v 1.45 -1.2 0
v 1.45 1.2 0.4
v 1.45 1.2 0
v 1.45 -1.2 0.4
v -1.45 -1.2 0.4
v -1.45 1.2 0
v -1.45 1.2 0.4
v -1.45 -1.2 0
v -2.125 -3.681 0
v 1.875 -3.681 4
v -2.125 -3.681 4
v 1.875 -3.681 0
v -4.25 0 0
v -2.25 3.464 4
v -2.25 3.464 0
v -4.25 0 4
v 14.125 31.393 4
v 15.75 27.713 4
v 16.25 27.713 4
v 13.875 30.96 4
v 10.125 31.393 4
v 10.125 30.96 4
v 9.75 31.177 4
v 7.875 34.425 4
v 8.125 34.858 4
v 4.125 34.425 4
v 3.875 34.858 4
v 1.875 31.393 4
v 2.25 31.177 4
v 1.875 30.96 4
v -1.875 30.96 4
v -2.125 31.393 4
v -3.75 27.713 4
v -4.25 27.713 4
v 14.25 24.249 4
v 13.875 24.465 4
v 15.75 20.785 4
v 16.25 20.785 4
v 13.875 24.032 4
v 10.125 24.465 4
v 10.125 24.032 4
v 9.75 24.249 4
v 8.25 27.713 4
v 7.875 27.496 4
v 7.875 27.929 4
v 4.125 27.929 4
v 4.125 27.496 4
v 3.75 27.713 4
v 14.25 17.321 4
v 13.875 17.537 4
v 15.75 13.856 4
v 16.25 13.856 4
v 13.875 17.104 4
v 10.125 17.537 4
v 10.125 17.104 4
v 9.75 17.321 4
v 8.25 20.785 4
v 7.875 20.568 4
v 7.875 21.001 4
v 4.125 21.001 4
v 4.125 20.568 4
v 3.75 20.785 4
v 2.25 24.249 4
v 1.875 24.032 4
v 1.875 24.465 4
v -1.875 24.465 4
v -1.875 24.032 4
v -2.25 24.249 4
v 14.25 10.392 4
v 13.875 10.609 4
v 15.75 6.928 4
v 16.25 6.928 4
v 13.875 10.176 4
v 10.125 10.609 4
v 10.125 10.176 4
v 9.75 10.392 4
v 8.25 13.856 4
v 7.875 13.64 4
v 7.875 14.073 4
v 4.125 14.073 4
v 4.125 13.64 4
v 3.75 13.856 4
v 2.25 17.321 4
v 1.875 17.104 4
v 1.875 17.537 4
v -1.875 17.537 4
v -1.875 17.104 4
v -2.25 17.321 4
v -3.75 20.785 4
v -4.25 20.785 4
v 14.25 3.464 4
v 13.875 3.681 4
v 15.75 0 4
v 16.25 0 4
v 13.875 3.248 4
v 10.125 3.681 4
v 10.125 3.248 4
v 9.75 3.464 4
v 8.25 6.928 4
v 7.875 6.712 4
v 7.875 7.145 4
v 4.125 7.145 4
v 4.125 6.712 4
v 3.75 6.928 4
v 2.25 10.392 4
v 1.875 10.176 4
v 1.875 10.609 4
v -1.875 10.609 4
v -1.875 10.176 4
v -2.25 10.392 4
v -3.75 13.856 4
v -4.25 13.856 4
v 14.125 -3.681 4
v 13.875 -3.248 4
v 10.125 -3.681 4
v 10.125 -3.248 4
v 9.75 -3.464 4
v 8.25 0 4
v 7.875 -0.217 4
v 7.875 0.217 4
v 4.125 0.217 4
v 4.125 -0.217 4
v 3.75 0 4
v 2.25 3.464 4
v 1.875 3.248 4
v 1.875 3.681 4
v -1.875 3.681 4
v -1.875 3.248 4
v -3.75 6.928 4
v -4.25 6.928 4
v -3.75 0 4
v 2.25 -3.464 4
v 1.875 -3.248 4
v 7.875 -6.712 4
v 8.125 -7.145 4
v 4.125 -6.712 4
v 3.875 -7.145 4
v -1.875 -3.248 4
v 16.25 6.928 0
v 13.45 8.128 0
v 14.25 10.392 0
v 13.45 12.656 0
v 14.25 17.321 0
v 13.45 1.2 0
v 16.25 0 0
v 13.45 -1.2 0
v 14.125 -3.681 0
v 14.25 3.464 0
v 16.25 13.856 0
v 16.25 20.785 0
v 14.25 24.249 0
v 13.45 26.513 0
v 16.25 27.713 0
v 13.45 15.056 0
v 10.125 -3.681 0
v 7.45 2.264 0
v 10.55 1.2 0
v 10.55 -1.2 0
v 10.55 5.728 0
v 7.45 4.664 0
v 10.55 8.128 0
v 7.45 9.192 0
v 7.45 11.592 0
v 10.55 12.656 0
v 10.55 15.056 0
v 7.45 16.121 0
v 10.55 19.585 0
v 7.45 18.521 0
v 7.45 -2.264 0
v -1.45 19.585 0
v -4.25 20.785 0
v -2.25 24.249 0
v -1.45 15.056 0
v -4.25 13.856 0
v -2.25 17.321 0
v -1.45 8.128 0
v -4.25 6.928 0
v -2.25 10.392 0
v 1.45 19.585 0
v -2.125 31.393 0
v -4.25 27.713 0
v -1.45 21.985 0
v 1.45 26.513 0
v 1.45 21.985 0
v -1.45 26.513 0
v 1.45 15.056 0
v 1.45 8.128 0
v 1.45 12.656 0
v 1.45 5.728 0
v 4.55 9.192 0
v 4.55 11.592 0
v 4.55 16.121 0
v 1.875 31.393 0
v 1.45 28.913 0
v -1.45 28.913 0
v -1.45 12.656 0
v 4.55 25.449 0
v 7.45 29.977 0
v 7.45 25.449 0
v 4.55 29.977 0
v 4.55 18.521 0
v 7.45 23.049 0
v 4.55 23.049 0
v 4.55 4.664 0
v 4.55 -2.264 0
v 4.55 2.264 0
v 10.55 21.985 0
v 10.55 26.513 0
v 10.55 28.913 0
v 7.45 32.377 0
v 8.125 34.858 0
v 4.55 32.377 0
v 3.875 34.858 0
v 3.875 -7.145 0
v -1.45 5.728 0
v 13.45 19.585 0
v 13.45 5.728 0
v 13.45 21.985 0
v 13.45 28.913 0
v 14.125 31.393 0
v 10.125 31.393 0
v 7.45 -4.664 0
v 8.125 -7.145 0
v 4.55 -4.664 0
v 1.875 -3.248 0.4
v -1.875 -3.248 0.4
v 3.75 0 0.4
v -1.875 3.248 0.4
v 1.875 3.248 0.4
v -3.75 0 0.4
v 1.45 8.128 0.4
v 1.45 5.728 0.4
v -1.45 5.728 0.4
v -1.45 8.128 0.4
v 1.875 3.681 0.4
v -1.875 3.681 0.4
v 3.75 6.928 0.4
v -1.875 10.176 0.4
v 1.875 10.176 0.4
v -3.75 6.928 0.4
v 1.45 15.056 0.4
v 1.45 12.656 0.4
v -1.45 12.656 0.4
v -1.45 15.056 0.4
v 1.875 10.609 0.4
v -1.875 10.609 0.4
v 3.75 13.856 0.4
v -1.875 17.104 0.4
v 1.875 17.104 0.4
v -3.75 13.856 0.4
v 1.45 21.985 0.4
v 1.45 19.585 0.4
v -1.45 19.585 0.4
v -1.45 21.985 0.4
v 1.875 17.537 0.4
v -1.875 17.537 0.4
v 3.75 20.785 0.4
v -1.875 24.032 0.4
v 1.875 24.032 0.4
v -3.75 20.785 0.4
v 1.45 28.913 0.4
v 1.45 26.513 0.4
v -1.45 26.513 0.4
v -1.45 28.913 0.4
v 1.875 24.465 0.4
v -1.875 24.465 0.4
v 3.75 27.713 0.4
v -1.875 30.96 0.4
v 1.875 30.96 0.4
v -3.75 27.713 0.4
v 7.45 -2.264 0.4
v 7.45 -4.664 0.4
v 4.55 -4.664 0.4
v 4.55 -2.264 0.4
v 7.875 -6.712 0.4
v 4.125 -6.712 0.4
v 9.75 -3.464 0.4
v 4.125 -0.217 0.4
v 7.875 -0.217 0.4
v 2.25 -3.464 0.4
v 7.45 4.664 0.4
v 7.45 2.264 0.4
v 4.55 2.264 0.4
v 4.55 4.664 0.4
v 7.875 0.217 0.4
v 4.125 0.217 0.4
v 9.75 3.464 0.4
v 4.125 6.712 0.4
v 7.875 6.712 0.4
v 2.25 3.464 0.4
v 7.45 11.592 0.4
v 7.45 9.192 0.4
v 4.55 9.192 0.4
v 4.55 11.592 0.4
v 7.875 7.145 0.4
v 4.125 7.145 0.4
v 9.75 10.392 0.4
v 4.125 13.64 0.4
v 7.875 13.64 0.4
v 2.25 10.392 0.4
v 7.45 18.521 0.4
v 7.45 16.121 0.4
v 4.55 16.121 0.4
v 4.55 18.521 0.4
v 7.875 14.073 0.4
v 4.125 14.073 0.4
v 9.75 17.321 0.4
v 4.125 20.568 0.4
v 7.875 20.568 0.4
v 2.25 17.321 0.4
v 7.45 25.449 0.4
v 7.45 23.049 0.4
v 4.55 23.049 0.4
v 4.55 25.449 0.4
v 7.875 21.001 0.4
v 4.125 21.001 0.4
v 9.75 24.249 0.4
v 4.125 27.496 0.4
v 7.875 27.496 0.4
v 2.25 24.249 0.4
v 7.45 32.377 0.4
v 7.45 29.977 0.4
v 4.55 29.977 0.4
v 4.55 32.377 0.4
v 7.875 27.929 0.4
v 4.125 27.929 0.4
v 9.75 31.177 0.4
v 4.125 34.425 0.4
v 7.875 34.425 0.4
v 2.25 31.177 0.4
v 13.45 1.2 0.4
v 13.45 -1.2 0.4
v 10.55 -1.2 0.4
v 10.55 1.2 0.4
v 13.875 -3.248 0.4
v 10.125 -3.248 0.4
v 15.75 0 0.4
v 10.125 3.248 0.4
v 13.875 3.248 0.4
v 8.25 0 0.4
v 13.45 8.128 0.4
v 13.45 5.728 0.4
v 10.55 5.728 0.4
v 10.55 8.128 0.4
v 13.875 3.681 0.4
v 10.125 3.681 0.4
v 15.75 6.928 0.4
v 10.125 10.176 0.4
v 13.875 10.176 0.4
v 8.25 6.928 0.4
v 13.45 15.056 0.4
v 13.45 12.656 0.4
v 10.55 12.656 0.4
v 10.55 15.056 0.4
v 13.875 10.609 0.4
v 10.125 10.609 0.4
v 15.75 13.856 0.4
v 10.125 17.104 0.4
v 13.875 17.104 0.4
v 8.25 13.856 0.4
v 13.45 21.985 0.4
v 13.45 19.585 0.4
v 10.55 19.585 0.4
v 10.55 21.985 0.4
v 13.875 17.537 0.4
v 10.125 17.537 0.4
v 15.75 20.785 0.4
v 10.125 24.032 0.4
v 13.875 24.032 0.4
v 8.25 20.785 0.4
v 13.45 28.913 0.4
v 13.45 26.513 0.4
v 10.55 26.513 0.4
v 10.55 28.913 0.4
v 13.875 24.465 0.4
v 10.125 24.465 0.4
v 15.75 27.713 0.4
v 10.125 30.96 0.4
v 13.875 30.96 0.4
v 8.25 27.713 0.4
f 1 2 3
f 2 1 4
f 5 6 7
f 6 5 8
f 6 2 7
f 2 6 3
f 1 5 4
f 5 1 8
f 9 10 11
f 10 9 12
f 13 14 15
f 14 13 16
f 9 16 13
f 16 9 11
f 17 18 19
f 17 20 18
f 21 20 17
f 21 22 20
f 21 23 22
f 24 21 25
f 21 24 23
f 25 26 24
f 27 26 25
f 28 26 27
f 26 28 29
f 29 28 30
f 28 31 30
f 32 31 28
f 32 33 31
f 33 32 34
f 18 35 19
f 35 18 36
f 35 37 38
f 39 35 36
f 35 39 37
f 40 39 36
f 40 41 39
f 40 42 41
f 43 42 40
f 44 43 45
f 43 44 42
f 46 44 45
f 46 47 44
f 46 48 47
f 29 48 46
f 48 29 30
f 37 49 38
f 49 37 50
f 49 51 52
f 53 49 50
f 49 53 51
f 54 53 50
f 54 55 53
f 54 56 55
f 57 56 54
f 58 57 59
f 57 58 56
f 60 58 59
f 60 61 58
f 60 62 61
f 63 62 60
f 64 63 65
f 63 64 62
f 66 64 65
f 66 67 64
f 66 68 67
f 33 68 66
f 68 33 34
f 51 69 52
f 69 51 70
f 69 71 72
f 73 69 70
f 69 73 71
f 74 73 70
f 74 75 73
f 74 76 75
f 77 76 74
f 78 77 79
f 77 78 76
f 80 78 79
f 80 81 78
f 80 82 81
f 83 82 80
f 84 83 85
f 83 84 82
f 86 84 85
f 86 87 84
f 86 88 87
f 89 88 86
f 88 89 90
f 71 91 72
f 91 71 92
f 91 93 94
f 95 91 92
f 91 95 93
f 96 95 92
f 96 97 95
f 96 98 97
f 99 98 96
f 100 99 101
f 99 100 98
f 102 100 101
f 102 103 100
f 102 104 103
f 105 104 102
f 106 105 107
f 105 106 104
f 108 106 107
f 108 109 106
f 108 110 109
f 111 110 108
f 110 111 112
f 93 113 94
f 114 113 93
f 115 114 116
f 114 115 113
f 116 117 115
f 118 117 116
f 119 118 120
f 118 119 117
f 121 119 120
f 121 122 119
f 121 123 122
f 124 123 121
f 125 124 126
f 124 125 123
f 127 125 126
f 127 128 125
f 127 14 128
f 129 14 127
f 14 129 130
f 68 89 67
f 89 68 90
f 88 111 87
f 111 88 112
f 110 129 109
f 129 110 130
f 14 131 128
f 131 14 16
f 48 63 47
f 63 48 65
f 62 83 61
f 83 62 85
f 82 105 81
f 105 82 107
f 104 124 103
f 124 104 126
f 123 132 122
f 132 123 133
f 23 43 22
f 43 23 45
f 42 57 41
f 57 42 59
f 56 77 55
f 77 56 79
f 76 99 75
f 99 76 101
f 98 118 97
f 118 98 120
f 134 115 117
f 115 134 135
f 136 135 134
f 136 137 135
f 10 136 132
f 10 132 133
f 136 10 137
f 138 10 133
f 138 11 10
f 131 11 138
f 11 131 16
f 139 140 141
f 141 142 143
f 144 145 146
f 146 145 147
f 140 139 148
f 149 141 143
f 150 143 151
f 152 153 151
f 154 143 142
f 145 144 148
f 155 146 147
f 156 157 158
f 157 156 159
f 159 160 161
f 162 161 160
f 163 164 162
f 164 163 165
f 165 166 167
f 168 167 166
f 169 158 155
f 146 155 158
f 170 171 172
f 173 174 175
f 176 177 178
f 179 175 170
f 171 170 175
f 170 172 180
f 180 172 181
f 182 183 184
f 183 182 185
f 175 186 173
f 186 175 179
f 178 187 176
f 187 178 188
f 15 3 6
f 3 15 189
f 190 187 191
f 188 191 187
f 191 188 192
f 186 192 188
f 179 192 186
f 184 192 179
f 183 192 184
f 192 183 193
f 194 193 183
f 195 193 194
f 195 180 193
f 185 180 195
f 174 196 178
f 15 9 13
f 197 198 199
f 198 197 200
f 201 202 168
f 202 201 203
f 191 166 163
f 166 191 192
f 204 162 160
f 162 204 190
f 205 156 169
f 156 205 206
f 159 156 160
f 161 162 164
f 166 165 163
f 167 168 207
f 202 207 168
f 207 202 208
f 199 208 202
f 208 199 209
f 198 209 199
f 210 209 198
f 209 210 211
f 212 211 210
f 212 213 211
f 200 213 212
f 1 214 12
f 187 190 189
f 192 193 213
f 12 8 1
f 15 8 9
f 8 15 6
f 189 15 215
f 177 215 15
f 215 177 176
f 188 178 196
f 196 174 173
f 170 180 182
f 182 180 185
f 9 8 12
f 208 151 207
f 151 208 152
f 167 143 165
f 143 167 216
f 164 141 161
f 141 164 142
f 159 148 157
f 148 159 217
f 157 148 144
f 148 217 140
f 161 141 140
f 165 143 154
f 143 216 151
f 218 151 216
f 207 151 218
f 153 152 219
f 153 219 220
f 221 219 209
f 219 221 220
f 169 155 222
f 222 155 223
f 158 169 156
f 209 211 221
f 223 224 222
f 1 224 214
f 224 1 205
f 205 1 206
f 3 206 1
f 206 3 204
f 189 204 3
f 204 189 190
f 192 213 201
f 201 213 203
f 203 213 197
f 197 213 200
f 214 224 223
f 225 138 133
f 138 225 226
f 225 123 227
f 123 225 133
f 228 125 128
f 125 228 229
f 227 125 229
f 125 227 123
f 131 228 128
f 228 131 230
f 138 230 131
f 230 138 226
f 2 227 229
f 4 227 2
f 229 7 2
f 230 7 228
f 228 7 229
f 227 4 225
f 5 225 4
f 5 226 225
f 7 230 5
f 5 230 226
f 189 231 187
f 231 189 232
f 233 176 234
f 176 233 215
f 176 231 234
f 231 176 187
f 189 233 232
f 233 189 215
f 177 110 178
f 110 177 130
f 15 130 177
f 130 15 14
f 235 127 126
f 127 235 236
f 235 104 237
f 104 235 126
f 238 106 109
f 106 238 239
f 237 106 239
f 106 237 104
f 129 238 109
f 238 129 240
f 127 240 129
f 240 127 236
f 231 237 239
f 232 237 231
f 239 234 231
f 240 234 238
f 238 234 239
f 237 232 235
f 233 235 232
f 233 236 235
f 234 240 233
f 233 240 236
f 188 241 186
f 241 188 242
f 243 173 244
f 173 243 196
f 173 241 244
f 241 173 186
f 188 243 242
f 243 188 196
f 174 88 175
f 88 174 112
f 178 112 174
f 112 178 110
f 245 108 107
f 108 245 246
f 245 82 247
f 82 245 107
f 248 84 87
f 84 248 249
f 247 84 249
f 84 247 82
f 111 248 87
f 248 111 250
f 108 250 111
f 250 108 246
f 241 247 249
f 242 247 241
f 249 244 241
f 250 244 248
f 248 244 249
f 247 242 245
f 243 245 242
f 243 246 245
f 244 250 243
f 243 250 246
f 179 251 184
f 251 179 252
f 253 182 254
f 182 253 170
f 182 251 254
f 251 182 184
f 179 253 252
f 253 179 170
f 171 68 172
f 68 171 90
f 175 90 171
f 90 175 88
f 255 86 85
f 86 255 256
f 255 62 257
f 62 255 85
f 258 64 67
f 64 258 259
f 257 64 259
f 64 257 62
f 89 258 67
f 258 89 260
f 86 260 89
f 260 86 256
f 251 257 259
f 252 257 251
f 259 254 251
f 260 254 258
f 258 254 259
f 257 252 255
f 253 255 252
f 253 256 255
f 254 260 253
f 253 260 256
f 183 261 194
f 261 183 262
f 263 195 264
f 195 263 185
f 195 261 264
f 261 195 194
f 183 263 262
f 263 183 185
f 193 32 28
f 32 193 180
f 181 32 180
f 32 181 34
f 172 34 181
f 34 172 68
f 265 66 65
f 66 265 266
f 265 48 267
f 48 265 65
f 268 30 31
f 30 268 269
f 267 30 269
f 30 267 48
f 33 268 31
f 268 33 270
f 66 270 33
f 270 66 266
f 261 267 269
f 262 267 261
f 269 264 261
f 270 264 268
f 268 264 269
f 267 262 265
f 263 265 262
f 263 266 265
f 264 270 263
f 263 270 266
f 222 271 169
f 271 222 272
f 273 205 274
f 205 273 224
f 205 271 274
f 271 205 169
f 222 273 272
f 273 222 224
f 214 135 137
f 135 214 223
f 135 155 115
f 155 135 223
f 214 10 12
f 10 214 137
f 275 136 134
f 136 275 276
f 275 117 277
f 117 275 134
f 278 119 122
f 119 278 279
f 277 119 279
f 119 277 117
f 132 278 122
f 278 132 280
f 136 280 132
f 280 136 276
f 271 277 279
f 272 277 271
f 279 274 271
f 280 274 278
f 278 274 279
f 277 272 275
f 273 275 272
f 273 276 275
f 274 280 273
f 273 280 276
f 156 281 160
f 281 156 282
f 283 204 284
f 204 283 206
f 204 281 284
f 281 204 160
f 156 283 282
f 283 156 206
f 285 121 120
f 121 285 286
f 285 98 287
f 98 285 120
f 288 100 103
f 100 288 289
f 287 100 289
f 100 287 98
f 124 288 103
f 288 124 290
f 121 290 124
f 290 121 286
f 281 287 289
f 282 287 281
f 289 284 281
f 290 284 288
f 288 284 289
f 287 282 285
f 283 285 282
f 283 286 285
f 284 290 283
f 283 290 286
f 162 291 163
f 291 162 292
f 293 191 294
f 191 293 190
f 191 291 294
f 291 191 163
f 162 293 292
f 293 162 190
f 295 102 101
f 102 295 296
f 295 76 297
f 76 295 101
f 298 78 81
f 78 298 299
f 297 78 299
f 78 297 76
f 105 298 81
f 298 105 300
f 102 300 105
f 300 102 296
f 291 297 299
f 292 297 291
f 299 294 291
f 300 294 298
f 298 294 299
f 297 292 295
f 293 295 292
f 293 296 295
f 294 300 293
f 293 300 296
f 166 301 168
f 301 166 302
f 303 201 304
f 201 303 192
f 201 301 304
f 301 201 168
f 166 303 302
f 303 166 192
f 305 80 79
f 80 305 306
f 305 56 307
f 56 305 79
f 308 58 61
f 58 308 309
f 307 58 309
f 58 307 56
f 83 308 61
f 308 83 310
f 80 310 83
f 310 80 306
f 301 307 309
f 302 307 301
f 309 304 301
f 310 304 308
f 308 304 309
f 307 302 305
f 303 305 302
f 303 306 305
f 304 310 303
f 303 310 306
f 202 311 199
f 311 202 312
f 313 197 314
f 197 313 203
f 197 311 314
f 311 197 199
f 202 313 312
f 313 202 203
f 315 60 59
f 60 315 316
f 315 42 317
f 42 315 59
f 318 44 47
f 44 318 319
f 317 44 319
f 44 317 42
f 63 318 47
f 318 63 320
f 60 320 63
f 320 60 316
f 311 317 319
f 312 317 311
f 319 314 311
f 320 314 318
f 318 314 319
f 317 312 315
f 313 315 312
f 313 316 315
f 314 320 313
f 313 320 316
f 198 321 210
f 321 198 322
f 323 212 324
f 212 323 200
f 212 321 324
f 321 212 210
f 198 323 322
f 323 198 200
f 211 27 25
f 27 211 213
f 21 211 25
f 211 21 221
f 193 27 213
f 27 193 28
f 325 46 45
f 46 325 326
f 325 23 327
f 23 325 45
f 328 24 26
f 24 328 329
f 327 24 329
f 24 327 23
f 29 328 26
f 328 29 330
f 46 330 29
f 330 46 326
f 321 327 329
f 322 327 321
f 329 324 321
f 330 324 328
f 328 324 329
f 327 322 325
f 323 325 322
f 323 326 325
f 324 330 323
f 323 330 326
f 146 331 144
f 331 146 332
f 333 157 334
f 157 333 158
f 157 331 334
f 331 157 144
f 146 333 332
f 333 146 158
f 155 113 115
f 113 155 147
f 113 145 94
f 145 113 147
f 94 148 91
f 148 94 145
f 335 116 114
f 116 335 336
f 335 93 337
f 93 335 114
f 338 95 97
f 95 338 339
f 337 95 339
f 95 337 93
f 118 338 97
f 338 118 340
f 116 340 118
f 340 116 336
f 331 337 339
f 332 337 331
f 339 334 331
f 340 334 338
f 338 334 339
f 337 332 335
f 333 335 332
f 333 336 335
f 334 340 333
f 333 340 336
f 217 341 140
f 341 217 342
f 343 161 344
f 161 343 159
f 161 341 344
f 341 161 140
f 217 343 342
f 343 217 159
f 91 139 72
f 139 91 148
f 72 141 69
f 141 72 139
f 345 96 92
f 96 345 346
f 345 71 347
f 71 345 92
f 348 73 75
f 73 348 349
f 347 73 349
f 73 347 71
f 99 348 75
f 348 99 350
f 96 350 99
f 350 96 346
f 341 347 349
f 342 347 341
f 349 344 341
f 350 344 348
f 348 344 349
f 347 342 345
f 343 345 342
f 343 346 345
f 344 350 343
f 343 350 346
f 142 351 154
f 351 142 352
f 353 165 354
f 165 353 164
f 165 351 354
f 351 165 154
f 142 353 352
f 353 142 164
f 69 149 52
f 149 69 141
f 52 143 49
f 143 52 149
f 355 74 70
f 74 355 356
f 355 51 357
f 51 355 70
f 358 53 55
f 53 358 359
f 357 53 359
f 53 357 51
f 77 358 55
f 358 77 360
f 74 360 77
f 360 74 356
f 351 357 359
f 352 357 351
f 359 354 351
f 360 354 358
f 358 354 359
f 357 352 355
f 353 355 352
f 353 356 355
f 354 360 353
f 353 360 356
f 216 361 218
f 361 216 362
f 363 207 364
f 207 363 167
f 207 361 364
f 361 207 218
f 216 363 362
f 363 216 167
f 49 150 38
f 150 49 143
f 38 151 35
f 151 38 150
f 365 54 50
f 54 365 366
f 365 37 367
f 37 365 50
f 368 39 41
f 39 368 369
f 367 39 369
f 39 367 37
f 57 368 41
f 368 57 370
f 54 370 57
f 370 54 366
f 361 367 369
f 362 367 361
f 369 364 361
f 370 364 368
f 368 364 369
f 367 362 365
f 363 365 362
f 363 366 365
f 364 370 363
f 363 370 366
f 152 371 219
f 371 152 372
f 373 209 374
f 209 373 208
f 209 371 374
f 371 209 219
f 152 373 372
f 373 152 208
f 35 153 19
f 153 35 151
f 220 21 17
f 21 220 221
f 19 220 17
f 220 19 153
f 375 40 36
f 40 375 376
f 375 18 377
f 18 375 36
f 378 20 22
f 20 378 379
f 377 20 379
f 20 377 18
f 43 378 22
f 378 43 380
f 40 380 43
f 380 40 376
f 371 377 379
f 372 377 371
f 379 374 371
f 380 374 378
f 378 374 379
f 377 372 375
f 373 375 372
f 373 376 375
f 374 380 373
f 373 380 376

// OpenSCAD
// file: parts.scad
/**
 * Martin Egli
 * 2024-05-15
 */

// origin: center
module rgbled2427(loc_res = 32) {
    color("White")
    difference() {
        translate([-2.7/2, -2.4/2, 0])
        cube([2.7, 2.4, 1.1]);
        translate([0, 0, 1.0])
        cylinder(d = 2, h = 0.5, $fn = loc_res);
        translate([0, 2, 1])
        rotate([0, 0, -45])
        cube([4, 4, 1]);
    }
}

// origin: center
module rgbled2427_cut(cut_hi = 2) {
    translate([-2.9/2, -2.4/2, -2])
    cube([2.9, 2.4, 2.5]);
    translate([-2.7/2, -2.4/2, 0])
    cube([2.7, 2.4, cut_hi]);
}
*rgbled2427();
*rgbled2427_cut();
// main file
/**
 * Martin Egli
 * 2024-05-15
 * testing honey comb structure to create the display
 * wall thickness: 0.5 mm
 * printing: 0.2 mm layer height
 */

use <parts.scad>

/* old unused
module hexagon_cover_element(hex_rad1 = 5/2, hex_hi1 = 2*0.2, hex_rad2 = 4/2, hex_hi2 = 2*0.4, hex_res = 6) {
    cylinder(r = hex_rad1, h = hex_hi1, $fn = hex_res);
    cylinder(r = hex_rad2, h = hex_hi2, $fn = hex_res);
}*/

module hexagon_cover_element(hex_rad1 = 8/2, hex_hi1 = 0.8, hex_res = 6) {
    cylinder(r = hex_rad1, h = hex_hi1, $fn = hex_res);
}

module hexagon_rest_element(hex_rad = 10/2, hex_hi = 4, wallth = 0.5, hex_res = 6) {
    difference() {
        cylinder(r = hex_rad + (wallth/2), h = hex_hi, $fn = hex_res);
        translate([0, 0, -1])
        cylinder(r = hex_rad - (wallth/2), h = hex_hi+2, $fn = hex_res);
    }
}

module hexagon_rest_element_led2427_cut(hex_rad = 8/2, hex_hi = 4, wallth = 0.5, hex_res = 6) {
    difference() {
        cylinder(r = hex_rad + (wallth/2), h = hex_hi, $fn = hex_res);
        translate([0, 0, 0.4])
        cylinder(r = hex_rad - (wallth/2), h = hex_hi+2, $fn = hex_res);
        
        rgbled2427_cut();
    }
}

hex_rad = 8/2;
/* calculate hexagon center positions
 * r: radius, use "hex_rad"
 * n: index in x axis
 * m: index in y axis
 * even columns
 * dxeven = n*2*r*cos(30)
 * dyeven = m*3/2*r
 * odd columns
 * dxodd = n*3/2*r
 * dyodd = (m-1/2)*r*cos(30)
 */
dx_even_factor = 3/2*hex_rad; // see dxeven = m*3*r
dy_even_factor = 2*hex_rad*cos(30); // see dyeven = n*2*r*cos(30)
dx_odd_factor = 3/2*hex_rad; // see dxodd = m*3/2*r
dy_odd_factor = hex_rad*cos(30); // see dyodd = (2n+1)*r*cos(30)
module place_hexagon_cover_element(x_pos = 0, y_pos = 0) {
    if((x_pos % 2) == 0) {
        // even column
        translate([x_pos*dx_even_factor, y_pos*dy_even_factor, 0])
        hexagon_cover_element();
    }
    else {
        // odd column
        translate([x_pos*dx_odd_factor, (2*y_pos-1)*dy_odd_factor, 0])
        hexagon_cover_element();
    }
}

module place_hexagon_rest_element(x_pos = 0, y_pos = 0) {
    if((x_pos % 2) == 0) {
        // even column
        translate([x_pos*dx_even_factor, y_pos*dy_even_factor, 0])
        hexagon_rest_element_led2427_cut();
    }
    else {
        // odd column
        translate([x_pos*dx_odd_factor, (2*y_pos-1)*dy_odd_factor, 0])
        hexagon_rest_element_led2427_cut();
    }
}

*translate([0, 0, 10]) {
place_hexagon_cover_element(0, 0);
place_hexagon_cover_element(0, 1);
place_hexagon_cover_element(0, 2);
place_hexagon_cover_element(0, 3);
place_hexagon_cover_element(0, 4);
place_hexagon_cover_element(1, 0);
place_hexagon_cover_element(1, 1);
place_hexagon_cover_element(1, 2);
place_hexagon_cover_element(1, 3);
place_hexagon_cover_element(1, 4);
place_hexagon_cover_element(1, 5);
place_hexagon_cover_element(2, 0);
place_hexagon_cover_element(2, 1);
place_hexagon_cover_element(2, 2);
place_hexagon_cover_element(2, 3);
place_hexagon_cover_element(2, 4);
}

place_hexagon_rest_element(0, 0);
place_hexagon_rest_element(0, 1);
place_hexagon_rest_element(0, 2);
place_hexagon_rest_element(0, 3);
place_hexagon_rest_element(0, 4);
place_hexagon_rest_element(1, 0);
place_hexagon_rest_element(1, 1);
place_hexagon_rest_element(1, 2);
place_hexagon_rest_element(1, 3);
place_hexagon_rest_element(1, 4);
place_hexagon_rest_element(1, 5);
place_hexagon_rest_element(2, 0);
place_hexagon_rest_element(2, 1);
place_hexagon_rest_element(2, 2);
place_hexagon_rest_element(2, 3);
place_hexagon_rest_element(2, 4);
